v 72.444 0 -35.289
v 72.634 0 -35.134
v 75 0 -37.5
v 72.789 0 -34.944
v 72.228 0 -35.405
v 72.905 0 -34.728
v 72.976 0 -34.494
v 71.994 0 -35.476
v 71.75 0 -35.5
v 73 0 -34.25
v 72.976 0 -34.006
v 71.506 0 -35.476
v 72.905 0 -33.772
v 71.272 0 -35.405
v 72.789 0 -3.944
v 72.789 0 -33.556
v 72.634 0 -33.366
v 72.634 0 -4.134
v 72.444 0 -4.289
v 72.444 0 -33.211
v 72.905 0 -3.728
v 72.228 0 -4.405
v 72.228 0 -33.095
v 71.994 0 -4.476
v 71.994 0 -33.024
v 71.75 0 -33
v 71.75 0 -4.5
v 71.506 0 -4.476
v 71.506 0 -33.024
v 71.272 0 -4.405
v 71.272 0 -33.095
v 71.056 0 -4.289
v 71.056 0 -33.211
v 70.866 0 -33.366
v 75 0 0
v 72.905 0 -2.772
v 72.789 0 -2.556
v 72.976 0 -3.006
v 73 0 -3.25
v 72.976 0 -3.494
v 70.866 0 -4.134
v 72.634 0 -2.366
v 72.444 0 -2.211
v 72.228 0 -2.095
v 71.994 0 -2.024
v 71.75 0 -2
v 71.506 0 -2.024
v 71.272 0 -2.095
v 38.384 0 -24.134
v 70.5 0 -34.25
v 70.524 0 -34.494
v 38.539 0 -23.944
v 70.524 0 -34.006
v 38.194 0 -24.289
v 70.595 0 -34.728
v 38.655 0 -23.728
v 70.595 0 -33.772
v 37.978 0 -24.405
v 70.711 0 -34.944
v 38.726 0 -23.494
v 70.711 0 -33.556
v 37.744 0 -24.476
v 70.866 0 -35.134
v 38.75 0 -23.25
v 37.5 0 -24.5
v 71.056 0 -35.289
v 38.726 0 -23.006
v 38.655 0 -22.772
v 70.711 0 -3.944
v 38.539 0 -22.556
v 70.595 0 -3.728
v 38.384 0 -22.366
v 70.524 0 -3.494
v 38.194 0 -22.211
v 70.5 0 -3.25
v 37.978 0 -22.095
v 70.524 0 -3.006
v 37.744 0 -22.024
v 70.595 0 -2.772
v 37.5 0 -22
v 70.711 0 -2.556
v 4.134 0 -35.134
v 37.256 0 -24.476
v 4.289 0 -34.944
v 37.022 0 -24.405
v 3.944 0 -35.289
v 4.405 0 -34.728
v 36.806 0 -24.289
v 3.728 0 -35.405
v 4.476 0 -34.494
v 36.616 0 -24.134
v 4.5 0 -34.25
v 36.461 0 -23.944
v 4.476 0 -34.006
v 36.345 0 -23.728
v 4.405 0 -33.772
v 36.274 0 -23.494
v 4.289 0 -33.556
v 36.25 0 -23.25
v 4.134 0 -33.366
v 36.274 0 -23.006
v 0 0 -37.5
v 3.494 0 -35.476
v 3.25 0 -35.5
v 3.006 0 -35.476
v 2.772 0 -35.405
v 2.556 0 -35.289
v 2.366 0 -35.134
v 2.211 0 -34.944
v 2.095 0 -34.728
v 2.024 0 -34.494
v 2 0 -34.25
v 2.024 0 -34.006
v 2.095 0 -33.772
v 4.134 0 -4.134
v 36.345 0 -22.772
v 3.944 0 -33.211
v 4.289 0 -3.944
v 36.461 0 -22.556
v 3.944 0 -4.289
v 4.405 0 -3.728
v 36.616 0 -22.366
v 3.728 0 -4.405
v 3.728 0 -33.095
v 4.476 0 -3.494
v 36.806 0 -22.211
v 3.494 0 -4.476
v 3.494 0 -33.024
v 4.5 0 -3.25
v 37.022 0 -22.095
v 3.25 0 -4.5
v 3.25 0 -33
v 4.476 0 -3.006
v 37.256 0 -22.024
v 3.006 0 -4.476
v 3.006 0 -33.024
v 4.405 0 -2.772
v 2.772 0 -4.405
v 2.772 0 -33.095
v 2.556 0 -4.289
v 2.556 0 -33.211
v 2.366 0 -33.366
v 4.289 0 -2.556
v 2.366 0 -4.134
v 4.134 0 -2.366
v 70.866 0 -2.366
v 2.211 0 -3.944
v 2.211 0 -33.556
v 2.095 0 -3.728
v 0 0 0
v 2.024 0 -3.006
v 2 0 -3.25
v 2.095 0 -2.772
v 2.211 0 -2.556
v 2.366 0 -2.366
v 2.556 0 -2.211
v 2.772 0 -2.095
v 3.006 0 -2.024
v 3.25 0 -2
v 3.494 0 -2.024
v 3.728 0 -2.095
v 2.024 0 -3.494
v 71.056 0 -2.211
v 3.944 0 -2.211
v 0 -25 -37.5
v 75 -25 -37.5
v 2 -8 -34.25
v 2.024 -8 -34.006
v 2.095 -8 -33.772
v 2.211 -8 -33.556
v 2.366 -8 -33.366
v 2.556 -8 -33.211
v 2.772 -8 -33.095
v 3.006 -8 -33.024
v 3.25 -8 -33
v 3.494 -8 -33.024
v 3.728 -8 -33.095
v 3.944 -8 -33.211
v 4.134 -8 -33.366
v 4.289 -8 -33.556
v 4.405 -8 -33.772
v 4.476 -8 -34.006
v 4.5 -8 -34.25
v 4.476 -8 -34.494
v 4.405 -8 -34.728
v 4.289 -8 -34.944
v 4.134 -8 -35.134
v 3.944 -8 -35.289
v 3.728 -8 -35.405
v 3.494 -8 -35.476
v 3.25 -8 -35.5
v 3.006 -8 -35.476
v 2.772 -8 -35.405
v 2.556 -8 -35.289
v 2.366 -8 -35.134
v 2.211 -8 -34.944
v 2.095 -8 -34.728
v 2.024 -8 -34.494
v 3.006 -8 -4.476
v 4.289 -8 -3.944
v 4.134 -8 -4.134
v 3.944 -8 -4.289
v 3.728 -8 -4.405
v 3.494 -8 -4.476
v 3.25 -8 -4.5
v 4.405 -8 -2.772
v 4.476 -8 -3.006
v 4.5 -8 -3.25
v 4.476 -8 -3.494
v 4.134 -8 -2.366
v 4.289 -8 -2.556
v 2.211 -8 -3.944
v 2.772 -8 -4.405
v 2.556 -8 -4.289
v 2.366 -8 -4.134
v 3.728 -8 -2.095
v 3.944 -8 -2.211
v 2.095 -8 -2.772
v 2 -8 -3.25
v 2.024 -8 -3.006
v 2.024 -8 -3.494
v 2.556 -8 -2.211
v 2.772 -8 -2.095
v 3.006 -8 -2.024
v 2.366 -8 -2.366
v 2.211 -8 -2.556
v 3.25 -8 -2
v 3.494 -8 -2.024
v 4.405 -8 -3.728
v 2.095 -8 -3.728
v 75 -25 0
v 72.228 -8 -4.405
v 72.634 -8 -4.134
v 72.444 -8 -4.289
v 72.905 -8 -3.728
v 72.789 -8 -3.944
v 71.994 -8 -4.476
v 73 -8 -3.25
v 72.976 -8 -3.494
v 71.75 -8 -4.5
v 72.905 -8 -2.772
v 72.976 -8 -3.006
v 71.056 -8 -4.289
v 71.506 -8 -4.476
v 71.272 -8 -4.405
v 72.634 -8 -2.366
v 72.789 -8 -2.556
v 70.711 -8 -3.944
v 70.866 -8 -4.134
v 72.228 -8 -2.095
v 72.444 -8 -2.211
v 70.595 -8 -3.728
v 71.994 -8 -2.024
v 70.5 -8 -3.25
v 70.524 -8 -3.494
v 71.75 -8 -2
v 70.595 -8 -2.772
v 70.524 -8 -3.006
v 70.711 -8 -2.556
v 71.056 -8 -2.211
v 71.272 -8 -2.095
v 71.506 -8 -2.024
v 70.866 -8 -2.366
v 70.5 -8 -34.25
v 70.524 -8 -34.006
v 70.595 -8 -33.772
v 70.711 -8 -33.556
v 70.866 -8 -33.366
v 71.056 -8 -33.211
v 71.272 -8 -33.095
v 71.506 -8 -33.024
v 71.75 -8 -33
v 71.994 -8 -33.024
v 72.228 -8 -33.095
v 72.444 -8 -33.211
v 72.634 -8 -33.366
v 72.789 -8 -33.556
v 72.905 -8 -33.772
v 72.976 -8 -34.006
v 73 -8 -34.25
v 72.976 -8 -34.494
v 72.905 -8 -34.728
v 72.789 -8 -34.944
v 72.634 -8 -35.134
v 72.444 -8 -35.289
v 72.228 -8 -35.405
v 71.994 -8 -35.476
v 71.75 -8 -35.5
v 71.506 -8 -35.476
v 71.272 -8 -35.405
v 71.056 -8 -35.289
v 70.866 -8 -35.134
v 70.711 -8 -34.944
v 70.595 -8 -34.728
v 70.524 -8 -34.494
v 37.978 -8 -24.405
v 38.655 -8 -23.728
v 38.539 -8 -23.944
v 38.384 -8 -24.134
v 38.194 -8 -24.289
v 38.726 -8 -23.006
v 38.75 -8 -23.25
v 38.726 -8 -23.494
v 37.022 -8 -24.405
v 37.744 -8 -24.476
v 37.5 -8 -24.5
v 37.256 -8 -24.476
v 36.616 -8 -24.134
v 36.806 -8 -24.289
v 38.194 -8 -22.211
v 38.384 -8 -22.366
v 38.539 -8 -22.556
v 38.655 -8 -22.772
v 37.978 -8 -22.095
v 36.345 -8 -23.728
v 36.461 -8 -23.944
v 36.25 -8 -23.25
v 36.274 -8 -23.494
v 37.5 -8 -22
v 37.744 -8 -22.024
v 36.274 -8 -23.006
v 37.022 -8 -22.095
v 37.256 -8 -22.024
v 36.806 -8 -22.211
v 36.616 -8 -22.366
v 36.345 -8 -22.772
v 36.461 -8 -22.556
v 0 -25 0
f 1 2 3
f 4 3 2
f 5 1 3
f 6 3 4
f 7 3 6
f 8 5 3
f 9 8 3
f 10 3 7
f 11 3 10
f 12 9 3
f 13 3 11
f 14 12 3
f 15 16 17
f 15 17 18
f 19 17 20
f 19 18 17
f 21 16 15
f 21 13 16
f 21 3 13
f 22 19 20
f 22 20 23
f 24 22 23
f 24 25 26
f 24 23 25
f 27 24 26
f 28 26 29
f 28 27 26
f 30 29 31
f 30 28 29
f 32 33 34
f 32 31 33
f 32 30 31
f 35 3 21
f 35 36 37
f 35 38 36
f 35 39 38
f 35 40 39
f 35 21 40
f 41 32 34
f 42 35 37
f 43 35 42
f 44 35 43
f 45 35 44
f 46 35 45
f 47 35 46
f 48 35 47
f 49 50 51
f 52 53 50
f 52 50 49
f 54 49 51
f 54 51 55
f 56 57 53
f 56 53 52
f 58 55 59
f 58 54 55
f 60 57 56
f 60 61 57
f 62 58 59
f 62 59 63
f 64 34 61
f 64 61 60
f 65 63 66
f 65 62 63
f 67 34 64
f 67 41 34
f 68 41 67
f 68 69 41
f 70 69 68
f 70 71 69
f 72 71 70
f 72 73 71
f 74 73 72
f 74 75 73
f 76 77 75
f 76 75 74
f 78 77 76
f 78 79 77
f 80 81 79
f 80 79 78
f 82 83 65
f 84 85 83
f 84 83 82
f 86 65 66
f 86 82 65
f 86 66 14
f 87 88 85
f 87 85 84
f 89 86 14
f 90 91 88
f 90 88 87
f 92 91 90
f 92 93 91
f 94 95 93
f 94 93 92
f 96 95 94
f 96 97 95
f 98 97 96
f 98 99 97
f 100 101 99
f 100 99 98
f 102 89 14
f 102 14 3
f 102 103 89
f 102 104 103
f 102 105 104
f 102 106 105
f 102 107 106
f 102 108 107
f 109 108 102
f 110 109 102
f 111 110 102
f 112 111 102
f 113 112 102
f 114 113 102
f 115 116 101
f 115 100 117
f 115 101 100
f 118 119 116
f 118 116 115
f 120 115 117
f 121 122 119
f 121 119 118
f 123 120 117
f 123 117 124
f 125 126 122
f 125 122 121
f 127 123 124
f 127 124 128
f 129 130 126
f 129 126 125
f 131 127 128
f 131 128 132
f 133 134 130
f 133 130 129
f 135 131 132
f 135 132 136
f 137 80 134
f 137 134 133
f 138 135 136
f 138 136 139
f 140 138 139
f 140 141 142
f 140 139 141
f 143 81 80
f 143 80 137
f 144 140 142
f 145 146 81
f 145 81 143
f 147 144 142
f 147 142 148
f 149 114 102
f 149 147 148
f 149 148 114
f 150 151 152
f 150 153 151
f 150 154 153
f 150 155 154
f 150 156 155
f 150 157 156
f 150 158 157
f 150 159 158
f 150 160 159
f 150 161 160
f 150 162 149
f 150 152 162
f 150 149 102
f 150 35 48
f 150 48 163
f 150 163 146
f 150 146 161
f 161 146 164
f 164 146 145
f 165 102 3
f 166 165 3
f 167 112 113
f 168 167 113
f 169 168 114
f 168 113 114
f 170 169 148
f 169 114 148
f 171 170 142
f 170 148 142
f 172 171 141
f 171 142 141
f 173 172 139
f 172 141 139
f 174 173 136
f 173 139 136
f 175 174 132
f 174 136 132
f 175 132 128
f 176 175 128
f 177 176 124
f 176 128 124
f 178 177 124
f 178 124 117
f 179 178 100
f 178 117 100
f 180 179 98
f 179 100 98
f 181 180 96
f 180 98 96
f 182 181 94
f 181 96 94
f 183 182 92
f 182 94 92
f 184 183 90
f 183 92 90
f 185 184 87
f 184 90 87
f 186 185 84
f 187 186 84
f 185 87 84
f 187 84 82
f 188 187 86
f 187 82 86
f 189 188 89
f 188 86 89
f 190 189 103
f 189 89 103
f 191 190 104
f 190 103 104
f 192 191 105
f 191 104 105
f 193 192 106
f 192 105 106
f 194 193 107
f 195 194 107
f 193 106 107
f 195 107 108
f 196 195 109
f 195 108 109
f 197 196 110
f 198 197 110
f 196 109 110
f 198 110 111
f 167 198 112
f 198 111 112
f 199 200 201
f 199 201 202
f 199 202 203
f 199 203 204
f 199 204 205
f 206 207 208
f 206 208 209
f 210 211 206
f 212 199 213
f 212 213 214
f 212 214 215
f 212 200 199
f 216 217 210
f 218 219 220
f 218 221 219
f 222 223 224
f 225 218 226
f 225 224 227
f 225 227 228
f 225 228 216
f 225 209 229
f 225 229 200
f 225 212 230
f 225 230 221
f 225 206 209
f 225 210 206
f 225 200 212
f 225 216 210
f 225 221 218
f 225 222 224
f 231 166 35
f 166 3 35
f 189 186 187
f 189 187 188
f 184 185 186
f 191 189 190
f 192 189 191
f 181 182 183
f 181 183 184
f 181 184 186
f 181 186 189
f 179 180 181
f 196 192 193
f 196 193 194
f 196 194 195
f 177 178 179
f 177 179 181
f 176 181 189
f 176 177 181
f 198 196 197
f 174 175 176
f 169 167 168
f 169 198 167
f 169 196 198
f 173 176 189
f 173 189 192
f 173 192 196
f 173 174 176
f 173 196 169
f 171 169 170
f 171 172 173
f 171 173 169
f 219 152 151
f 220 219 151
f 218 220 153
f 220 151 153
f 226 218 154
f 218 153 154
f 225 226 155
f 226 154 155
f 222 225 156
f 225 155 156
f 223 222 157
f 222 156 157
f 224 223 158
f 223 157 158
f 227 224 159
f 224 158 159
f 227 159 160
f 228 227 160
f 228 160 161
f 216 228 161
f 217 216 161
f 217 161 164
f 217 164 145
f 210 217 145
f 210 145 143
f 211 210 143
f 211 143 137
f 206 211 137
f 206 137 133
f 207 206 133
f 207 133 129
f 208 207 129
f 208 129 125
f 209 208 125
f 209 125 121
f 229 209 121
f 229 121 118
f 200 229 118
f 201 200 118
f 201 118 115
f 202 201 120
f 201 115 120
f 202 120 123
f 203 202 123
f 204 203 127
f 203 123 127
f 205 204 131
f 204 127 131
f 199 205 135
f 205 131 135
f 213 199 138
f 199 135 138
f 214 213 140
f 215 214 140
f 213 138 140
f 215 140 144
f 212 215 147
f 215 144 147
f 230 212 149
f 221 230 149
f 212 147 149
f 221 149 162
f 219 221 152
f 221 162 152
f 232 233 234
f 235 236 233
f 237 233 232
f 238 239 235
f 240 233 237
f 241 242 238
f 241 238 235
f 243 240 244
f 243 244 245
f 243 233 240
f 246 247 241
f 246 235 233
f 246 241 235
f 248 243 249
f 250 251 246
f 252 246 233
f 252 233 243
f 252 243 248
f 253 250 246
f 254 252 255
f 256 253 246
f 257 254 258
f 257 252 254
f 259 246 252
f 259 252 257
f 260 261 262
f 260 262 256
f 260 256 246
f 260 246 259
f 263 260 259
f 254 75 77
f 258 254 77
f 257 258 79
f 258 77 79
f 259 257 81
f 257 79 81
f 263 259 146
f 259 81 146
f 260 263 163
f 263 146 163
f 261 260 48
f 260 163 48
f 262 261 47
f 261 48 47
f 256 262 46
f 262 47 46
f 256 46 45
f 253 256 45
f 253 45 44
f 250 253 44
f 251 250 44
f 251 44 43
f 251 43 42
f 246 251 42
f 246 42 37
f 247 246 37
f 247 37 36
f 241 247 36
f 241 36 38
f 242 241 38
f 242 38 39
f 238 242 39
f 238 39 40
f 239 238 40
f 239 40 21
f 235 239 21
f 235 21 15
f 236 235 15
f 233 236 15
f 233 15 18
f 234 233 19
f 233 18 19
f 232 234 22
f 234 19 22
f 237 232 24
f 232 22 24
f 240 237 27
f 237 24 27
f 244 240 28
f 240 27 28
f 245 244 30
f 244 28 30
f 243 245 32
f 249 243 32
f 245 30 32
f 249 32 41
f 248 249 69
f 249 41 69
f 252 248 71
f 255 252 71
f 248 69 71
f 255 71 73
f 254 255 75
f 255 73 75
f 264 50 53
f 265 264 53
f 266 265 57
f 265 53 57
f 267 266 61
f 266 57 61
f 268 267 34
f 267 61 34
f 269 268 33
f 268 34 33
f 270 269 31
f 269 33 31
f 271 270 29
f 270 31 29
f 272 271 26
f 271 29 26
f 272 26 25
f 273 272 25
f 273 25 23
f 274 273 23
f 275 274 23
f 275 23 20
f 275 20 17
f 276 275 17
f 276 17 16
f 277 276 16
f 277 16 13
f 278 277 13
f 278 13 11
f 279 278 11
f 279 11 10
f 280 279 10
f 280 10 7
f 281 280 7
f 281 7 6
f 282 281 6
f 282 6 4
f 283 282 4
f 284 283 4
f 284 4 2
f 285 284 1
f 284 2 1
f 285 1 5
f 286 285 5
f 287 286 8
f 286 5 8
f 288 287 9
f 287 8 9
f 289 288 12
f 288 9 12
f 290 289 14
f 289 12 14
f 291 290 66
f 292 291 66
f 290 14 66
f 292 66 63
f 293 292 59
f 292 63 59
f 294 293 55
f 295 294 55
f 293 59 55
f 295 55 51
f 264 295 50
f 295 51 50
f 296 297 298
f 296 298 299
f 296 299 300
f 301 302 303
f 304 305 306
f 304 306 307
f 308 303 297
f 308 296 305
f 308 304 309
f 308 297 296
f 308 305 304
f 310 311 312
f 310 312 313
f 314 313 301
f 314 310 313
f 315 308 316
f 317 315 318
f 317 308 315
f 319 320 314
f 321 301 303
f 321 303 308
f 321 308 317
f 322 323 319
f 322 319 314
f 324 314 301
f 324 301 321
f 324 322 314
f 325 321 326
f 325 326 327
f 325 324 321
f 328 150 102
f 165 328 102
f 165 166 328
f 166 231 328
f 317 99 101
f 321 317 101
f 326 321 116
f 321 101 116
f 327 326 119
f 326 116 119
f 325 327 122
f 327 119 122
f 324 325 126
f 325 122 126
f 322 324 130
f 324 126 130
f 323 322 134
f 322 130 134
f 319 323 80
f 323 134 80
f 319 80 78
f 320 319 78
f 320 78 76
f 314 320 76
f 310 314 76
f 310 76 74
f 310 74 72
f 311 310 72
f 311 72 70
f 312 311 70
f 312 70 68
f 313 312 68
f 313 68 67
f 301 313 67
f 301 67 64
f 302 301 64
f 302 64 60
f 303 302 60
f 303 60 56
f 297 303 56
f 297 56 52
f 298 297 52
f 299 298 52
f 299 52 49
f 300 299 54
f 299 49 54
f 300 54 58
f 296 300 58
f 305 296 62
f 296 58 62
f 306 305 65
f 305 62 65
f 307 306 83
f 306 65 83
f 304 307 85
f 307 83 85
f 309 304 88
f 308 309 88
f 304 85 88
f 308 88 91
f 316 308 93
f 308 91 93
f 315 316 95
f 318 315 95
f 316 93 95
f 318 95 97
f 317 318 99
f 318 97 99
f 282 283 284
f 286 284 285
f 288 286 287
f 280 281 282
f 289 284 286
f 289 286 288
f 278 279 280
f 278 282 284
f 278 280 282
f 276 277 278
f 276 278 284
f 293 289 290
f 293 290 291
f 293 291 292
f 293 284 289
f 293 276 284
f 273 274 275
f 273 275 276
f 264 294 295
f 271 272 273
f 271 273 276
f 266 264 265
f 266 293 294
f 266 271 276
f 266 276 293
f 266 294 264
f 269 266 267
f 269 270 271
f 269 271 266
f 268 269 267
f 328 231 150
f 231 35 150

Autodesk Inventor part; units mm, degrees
ref_plane "YZ Plane" through (0, 0, 0) normal (1, 0, 0) x (0, 1, 0)
ref_plane "XZ Plane" through (0, 0, 0) normal (0, 1, 0) x (-1, 0, 0)
ref_plane "XY Plane" through (0, 0, 0) normal (0, 0, 1) x (1, 0, 0)
sketch "Sketch1" plane through (0, 0, 0) normal (0, 1, 0) x (-1, 0, 0)
  line L0 (0, -37.5) -> (-75, -37.5)
  line L1 (-75, -37.5) -> (-75, 0)
  line L2 (-75, 0) -> (0, 0)
  line L3 (0, 0) -> (0, -37.5)
  line L4 (-3.25, -34.25) -> (-71.75, -34.25) construction
  line L5 (-71.75, -34.25) -> (-71.75, -3.25) construction
  line L6 (-71.75, -3.25) -> (-3.25, -3.25) construction
  line L7 (-3.25, -3.25) -> (-3.25, -34.25) construction
  circle A0 centre (-3.25, -34.25) radius 1.25
  circle A1 centre (-37.5, -23.25) radius 1.25
  circle A2 centre (-3.25, -3.25) radius 1.25
  circle A3 centre (-71.75, -3.25) radius 1.25
  circle A4 centre (-71.75, -34.25) radius 1.25
  point P0 (-37.5, -34.25)
  point P1 (-37.5, -37.5)
  point P2 (-3.25, -18.75)
  point P3 (0, -18.75)
  dimension "d0" = 37.5
  dimension "d1" = 75
  dimension "d2" = 31
  dimension "d3" = 68.5
  dimension "d4" = 2.5
  dimension "d6" = 2.5
  dimension "d7" = 2.5
  dimension "d8" = 2.5
  dimension "d9" = 2.5
  dimension "d10" = 34.25
  dimension "d11" = 11
extrude "Extrusion1" add sketch "Sketch1" against normal blind 25 contours L0 L1 L2 L3 | A0 | A1 | A2 | A3 | A4
extrude "Extrusion2" cut sketch "Sketch1" against normal blind 8 contours A0 | A1 | A2 | A3 | A4
properties part number "heatsink-CNC"
